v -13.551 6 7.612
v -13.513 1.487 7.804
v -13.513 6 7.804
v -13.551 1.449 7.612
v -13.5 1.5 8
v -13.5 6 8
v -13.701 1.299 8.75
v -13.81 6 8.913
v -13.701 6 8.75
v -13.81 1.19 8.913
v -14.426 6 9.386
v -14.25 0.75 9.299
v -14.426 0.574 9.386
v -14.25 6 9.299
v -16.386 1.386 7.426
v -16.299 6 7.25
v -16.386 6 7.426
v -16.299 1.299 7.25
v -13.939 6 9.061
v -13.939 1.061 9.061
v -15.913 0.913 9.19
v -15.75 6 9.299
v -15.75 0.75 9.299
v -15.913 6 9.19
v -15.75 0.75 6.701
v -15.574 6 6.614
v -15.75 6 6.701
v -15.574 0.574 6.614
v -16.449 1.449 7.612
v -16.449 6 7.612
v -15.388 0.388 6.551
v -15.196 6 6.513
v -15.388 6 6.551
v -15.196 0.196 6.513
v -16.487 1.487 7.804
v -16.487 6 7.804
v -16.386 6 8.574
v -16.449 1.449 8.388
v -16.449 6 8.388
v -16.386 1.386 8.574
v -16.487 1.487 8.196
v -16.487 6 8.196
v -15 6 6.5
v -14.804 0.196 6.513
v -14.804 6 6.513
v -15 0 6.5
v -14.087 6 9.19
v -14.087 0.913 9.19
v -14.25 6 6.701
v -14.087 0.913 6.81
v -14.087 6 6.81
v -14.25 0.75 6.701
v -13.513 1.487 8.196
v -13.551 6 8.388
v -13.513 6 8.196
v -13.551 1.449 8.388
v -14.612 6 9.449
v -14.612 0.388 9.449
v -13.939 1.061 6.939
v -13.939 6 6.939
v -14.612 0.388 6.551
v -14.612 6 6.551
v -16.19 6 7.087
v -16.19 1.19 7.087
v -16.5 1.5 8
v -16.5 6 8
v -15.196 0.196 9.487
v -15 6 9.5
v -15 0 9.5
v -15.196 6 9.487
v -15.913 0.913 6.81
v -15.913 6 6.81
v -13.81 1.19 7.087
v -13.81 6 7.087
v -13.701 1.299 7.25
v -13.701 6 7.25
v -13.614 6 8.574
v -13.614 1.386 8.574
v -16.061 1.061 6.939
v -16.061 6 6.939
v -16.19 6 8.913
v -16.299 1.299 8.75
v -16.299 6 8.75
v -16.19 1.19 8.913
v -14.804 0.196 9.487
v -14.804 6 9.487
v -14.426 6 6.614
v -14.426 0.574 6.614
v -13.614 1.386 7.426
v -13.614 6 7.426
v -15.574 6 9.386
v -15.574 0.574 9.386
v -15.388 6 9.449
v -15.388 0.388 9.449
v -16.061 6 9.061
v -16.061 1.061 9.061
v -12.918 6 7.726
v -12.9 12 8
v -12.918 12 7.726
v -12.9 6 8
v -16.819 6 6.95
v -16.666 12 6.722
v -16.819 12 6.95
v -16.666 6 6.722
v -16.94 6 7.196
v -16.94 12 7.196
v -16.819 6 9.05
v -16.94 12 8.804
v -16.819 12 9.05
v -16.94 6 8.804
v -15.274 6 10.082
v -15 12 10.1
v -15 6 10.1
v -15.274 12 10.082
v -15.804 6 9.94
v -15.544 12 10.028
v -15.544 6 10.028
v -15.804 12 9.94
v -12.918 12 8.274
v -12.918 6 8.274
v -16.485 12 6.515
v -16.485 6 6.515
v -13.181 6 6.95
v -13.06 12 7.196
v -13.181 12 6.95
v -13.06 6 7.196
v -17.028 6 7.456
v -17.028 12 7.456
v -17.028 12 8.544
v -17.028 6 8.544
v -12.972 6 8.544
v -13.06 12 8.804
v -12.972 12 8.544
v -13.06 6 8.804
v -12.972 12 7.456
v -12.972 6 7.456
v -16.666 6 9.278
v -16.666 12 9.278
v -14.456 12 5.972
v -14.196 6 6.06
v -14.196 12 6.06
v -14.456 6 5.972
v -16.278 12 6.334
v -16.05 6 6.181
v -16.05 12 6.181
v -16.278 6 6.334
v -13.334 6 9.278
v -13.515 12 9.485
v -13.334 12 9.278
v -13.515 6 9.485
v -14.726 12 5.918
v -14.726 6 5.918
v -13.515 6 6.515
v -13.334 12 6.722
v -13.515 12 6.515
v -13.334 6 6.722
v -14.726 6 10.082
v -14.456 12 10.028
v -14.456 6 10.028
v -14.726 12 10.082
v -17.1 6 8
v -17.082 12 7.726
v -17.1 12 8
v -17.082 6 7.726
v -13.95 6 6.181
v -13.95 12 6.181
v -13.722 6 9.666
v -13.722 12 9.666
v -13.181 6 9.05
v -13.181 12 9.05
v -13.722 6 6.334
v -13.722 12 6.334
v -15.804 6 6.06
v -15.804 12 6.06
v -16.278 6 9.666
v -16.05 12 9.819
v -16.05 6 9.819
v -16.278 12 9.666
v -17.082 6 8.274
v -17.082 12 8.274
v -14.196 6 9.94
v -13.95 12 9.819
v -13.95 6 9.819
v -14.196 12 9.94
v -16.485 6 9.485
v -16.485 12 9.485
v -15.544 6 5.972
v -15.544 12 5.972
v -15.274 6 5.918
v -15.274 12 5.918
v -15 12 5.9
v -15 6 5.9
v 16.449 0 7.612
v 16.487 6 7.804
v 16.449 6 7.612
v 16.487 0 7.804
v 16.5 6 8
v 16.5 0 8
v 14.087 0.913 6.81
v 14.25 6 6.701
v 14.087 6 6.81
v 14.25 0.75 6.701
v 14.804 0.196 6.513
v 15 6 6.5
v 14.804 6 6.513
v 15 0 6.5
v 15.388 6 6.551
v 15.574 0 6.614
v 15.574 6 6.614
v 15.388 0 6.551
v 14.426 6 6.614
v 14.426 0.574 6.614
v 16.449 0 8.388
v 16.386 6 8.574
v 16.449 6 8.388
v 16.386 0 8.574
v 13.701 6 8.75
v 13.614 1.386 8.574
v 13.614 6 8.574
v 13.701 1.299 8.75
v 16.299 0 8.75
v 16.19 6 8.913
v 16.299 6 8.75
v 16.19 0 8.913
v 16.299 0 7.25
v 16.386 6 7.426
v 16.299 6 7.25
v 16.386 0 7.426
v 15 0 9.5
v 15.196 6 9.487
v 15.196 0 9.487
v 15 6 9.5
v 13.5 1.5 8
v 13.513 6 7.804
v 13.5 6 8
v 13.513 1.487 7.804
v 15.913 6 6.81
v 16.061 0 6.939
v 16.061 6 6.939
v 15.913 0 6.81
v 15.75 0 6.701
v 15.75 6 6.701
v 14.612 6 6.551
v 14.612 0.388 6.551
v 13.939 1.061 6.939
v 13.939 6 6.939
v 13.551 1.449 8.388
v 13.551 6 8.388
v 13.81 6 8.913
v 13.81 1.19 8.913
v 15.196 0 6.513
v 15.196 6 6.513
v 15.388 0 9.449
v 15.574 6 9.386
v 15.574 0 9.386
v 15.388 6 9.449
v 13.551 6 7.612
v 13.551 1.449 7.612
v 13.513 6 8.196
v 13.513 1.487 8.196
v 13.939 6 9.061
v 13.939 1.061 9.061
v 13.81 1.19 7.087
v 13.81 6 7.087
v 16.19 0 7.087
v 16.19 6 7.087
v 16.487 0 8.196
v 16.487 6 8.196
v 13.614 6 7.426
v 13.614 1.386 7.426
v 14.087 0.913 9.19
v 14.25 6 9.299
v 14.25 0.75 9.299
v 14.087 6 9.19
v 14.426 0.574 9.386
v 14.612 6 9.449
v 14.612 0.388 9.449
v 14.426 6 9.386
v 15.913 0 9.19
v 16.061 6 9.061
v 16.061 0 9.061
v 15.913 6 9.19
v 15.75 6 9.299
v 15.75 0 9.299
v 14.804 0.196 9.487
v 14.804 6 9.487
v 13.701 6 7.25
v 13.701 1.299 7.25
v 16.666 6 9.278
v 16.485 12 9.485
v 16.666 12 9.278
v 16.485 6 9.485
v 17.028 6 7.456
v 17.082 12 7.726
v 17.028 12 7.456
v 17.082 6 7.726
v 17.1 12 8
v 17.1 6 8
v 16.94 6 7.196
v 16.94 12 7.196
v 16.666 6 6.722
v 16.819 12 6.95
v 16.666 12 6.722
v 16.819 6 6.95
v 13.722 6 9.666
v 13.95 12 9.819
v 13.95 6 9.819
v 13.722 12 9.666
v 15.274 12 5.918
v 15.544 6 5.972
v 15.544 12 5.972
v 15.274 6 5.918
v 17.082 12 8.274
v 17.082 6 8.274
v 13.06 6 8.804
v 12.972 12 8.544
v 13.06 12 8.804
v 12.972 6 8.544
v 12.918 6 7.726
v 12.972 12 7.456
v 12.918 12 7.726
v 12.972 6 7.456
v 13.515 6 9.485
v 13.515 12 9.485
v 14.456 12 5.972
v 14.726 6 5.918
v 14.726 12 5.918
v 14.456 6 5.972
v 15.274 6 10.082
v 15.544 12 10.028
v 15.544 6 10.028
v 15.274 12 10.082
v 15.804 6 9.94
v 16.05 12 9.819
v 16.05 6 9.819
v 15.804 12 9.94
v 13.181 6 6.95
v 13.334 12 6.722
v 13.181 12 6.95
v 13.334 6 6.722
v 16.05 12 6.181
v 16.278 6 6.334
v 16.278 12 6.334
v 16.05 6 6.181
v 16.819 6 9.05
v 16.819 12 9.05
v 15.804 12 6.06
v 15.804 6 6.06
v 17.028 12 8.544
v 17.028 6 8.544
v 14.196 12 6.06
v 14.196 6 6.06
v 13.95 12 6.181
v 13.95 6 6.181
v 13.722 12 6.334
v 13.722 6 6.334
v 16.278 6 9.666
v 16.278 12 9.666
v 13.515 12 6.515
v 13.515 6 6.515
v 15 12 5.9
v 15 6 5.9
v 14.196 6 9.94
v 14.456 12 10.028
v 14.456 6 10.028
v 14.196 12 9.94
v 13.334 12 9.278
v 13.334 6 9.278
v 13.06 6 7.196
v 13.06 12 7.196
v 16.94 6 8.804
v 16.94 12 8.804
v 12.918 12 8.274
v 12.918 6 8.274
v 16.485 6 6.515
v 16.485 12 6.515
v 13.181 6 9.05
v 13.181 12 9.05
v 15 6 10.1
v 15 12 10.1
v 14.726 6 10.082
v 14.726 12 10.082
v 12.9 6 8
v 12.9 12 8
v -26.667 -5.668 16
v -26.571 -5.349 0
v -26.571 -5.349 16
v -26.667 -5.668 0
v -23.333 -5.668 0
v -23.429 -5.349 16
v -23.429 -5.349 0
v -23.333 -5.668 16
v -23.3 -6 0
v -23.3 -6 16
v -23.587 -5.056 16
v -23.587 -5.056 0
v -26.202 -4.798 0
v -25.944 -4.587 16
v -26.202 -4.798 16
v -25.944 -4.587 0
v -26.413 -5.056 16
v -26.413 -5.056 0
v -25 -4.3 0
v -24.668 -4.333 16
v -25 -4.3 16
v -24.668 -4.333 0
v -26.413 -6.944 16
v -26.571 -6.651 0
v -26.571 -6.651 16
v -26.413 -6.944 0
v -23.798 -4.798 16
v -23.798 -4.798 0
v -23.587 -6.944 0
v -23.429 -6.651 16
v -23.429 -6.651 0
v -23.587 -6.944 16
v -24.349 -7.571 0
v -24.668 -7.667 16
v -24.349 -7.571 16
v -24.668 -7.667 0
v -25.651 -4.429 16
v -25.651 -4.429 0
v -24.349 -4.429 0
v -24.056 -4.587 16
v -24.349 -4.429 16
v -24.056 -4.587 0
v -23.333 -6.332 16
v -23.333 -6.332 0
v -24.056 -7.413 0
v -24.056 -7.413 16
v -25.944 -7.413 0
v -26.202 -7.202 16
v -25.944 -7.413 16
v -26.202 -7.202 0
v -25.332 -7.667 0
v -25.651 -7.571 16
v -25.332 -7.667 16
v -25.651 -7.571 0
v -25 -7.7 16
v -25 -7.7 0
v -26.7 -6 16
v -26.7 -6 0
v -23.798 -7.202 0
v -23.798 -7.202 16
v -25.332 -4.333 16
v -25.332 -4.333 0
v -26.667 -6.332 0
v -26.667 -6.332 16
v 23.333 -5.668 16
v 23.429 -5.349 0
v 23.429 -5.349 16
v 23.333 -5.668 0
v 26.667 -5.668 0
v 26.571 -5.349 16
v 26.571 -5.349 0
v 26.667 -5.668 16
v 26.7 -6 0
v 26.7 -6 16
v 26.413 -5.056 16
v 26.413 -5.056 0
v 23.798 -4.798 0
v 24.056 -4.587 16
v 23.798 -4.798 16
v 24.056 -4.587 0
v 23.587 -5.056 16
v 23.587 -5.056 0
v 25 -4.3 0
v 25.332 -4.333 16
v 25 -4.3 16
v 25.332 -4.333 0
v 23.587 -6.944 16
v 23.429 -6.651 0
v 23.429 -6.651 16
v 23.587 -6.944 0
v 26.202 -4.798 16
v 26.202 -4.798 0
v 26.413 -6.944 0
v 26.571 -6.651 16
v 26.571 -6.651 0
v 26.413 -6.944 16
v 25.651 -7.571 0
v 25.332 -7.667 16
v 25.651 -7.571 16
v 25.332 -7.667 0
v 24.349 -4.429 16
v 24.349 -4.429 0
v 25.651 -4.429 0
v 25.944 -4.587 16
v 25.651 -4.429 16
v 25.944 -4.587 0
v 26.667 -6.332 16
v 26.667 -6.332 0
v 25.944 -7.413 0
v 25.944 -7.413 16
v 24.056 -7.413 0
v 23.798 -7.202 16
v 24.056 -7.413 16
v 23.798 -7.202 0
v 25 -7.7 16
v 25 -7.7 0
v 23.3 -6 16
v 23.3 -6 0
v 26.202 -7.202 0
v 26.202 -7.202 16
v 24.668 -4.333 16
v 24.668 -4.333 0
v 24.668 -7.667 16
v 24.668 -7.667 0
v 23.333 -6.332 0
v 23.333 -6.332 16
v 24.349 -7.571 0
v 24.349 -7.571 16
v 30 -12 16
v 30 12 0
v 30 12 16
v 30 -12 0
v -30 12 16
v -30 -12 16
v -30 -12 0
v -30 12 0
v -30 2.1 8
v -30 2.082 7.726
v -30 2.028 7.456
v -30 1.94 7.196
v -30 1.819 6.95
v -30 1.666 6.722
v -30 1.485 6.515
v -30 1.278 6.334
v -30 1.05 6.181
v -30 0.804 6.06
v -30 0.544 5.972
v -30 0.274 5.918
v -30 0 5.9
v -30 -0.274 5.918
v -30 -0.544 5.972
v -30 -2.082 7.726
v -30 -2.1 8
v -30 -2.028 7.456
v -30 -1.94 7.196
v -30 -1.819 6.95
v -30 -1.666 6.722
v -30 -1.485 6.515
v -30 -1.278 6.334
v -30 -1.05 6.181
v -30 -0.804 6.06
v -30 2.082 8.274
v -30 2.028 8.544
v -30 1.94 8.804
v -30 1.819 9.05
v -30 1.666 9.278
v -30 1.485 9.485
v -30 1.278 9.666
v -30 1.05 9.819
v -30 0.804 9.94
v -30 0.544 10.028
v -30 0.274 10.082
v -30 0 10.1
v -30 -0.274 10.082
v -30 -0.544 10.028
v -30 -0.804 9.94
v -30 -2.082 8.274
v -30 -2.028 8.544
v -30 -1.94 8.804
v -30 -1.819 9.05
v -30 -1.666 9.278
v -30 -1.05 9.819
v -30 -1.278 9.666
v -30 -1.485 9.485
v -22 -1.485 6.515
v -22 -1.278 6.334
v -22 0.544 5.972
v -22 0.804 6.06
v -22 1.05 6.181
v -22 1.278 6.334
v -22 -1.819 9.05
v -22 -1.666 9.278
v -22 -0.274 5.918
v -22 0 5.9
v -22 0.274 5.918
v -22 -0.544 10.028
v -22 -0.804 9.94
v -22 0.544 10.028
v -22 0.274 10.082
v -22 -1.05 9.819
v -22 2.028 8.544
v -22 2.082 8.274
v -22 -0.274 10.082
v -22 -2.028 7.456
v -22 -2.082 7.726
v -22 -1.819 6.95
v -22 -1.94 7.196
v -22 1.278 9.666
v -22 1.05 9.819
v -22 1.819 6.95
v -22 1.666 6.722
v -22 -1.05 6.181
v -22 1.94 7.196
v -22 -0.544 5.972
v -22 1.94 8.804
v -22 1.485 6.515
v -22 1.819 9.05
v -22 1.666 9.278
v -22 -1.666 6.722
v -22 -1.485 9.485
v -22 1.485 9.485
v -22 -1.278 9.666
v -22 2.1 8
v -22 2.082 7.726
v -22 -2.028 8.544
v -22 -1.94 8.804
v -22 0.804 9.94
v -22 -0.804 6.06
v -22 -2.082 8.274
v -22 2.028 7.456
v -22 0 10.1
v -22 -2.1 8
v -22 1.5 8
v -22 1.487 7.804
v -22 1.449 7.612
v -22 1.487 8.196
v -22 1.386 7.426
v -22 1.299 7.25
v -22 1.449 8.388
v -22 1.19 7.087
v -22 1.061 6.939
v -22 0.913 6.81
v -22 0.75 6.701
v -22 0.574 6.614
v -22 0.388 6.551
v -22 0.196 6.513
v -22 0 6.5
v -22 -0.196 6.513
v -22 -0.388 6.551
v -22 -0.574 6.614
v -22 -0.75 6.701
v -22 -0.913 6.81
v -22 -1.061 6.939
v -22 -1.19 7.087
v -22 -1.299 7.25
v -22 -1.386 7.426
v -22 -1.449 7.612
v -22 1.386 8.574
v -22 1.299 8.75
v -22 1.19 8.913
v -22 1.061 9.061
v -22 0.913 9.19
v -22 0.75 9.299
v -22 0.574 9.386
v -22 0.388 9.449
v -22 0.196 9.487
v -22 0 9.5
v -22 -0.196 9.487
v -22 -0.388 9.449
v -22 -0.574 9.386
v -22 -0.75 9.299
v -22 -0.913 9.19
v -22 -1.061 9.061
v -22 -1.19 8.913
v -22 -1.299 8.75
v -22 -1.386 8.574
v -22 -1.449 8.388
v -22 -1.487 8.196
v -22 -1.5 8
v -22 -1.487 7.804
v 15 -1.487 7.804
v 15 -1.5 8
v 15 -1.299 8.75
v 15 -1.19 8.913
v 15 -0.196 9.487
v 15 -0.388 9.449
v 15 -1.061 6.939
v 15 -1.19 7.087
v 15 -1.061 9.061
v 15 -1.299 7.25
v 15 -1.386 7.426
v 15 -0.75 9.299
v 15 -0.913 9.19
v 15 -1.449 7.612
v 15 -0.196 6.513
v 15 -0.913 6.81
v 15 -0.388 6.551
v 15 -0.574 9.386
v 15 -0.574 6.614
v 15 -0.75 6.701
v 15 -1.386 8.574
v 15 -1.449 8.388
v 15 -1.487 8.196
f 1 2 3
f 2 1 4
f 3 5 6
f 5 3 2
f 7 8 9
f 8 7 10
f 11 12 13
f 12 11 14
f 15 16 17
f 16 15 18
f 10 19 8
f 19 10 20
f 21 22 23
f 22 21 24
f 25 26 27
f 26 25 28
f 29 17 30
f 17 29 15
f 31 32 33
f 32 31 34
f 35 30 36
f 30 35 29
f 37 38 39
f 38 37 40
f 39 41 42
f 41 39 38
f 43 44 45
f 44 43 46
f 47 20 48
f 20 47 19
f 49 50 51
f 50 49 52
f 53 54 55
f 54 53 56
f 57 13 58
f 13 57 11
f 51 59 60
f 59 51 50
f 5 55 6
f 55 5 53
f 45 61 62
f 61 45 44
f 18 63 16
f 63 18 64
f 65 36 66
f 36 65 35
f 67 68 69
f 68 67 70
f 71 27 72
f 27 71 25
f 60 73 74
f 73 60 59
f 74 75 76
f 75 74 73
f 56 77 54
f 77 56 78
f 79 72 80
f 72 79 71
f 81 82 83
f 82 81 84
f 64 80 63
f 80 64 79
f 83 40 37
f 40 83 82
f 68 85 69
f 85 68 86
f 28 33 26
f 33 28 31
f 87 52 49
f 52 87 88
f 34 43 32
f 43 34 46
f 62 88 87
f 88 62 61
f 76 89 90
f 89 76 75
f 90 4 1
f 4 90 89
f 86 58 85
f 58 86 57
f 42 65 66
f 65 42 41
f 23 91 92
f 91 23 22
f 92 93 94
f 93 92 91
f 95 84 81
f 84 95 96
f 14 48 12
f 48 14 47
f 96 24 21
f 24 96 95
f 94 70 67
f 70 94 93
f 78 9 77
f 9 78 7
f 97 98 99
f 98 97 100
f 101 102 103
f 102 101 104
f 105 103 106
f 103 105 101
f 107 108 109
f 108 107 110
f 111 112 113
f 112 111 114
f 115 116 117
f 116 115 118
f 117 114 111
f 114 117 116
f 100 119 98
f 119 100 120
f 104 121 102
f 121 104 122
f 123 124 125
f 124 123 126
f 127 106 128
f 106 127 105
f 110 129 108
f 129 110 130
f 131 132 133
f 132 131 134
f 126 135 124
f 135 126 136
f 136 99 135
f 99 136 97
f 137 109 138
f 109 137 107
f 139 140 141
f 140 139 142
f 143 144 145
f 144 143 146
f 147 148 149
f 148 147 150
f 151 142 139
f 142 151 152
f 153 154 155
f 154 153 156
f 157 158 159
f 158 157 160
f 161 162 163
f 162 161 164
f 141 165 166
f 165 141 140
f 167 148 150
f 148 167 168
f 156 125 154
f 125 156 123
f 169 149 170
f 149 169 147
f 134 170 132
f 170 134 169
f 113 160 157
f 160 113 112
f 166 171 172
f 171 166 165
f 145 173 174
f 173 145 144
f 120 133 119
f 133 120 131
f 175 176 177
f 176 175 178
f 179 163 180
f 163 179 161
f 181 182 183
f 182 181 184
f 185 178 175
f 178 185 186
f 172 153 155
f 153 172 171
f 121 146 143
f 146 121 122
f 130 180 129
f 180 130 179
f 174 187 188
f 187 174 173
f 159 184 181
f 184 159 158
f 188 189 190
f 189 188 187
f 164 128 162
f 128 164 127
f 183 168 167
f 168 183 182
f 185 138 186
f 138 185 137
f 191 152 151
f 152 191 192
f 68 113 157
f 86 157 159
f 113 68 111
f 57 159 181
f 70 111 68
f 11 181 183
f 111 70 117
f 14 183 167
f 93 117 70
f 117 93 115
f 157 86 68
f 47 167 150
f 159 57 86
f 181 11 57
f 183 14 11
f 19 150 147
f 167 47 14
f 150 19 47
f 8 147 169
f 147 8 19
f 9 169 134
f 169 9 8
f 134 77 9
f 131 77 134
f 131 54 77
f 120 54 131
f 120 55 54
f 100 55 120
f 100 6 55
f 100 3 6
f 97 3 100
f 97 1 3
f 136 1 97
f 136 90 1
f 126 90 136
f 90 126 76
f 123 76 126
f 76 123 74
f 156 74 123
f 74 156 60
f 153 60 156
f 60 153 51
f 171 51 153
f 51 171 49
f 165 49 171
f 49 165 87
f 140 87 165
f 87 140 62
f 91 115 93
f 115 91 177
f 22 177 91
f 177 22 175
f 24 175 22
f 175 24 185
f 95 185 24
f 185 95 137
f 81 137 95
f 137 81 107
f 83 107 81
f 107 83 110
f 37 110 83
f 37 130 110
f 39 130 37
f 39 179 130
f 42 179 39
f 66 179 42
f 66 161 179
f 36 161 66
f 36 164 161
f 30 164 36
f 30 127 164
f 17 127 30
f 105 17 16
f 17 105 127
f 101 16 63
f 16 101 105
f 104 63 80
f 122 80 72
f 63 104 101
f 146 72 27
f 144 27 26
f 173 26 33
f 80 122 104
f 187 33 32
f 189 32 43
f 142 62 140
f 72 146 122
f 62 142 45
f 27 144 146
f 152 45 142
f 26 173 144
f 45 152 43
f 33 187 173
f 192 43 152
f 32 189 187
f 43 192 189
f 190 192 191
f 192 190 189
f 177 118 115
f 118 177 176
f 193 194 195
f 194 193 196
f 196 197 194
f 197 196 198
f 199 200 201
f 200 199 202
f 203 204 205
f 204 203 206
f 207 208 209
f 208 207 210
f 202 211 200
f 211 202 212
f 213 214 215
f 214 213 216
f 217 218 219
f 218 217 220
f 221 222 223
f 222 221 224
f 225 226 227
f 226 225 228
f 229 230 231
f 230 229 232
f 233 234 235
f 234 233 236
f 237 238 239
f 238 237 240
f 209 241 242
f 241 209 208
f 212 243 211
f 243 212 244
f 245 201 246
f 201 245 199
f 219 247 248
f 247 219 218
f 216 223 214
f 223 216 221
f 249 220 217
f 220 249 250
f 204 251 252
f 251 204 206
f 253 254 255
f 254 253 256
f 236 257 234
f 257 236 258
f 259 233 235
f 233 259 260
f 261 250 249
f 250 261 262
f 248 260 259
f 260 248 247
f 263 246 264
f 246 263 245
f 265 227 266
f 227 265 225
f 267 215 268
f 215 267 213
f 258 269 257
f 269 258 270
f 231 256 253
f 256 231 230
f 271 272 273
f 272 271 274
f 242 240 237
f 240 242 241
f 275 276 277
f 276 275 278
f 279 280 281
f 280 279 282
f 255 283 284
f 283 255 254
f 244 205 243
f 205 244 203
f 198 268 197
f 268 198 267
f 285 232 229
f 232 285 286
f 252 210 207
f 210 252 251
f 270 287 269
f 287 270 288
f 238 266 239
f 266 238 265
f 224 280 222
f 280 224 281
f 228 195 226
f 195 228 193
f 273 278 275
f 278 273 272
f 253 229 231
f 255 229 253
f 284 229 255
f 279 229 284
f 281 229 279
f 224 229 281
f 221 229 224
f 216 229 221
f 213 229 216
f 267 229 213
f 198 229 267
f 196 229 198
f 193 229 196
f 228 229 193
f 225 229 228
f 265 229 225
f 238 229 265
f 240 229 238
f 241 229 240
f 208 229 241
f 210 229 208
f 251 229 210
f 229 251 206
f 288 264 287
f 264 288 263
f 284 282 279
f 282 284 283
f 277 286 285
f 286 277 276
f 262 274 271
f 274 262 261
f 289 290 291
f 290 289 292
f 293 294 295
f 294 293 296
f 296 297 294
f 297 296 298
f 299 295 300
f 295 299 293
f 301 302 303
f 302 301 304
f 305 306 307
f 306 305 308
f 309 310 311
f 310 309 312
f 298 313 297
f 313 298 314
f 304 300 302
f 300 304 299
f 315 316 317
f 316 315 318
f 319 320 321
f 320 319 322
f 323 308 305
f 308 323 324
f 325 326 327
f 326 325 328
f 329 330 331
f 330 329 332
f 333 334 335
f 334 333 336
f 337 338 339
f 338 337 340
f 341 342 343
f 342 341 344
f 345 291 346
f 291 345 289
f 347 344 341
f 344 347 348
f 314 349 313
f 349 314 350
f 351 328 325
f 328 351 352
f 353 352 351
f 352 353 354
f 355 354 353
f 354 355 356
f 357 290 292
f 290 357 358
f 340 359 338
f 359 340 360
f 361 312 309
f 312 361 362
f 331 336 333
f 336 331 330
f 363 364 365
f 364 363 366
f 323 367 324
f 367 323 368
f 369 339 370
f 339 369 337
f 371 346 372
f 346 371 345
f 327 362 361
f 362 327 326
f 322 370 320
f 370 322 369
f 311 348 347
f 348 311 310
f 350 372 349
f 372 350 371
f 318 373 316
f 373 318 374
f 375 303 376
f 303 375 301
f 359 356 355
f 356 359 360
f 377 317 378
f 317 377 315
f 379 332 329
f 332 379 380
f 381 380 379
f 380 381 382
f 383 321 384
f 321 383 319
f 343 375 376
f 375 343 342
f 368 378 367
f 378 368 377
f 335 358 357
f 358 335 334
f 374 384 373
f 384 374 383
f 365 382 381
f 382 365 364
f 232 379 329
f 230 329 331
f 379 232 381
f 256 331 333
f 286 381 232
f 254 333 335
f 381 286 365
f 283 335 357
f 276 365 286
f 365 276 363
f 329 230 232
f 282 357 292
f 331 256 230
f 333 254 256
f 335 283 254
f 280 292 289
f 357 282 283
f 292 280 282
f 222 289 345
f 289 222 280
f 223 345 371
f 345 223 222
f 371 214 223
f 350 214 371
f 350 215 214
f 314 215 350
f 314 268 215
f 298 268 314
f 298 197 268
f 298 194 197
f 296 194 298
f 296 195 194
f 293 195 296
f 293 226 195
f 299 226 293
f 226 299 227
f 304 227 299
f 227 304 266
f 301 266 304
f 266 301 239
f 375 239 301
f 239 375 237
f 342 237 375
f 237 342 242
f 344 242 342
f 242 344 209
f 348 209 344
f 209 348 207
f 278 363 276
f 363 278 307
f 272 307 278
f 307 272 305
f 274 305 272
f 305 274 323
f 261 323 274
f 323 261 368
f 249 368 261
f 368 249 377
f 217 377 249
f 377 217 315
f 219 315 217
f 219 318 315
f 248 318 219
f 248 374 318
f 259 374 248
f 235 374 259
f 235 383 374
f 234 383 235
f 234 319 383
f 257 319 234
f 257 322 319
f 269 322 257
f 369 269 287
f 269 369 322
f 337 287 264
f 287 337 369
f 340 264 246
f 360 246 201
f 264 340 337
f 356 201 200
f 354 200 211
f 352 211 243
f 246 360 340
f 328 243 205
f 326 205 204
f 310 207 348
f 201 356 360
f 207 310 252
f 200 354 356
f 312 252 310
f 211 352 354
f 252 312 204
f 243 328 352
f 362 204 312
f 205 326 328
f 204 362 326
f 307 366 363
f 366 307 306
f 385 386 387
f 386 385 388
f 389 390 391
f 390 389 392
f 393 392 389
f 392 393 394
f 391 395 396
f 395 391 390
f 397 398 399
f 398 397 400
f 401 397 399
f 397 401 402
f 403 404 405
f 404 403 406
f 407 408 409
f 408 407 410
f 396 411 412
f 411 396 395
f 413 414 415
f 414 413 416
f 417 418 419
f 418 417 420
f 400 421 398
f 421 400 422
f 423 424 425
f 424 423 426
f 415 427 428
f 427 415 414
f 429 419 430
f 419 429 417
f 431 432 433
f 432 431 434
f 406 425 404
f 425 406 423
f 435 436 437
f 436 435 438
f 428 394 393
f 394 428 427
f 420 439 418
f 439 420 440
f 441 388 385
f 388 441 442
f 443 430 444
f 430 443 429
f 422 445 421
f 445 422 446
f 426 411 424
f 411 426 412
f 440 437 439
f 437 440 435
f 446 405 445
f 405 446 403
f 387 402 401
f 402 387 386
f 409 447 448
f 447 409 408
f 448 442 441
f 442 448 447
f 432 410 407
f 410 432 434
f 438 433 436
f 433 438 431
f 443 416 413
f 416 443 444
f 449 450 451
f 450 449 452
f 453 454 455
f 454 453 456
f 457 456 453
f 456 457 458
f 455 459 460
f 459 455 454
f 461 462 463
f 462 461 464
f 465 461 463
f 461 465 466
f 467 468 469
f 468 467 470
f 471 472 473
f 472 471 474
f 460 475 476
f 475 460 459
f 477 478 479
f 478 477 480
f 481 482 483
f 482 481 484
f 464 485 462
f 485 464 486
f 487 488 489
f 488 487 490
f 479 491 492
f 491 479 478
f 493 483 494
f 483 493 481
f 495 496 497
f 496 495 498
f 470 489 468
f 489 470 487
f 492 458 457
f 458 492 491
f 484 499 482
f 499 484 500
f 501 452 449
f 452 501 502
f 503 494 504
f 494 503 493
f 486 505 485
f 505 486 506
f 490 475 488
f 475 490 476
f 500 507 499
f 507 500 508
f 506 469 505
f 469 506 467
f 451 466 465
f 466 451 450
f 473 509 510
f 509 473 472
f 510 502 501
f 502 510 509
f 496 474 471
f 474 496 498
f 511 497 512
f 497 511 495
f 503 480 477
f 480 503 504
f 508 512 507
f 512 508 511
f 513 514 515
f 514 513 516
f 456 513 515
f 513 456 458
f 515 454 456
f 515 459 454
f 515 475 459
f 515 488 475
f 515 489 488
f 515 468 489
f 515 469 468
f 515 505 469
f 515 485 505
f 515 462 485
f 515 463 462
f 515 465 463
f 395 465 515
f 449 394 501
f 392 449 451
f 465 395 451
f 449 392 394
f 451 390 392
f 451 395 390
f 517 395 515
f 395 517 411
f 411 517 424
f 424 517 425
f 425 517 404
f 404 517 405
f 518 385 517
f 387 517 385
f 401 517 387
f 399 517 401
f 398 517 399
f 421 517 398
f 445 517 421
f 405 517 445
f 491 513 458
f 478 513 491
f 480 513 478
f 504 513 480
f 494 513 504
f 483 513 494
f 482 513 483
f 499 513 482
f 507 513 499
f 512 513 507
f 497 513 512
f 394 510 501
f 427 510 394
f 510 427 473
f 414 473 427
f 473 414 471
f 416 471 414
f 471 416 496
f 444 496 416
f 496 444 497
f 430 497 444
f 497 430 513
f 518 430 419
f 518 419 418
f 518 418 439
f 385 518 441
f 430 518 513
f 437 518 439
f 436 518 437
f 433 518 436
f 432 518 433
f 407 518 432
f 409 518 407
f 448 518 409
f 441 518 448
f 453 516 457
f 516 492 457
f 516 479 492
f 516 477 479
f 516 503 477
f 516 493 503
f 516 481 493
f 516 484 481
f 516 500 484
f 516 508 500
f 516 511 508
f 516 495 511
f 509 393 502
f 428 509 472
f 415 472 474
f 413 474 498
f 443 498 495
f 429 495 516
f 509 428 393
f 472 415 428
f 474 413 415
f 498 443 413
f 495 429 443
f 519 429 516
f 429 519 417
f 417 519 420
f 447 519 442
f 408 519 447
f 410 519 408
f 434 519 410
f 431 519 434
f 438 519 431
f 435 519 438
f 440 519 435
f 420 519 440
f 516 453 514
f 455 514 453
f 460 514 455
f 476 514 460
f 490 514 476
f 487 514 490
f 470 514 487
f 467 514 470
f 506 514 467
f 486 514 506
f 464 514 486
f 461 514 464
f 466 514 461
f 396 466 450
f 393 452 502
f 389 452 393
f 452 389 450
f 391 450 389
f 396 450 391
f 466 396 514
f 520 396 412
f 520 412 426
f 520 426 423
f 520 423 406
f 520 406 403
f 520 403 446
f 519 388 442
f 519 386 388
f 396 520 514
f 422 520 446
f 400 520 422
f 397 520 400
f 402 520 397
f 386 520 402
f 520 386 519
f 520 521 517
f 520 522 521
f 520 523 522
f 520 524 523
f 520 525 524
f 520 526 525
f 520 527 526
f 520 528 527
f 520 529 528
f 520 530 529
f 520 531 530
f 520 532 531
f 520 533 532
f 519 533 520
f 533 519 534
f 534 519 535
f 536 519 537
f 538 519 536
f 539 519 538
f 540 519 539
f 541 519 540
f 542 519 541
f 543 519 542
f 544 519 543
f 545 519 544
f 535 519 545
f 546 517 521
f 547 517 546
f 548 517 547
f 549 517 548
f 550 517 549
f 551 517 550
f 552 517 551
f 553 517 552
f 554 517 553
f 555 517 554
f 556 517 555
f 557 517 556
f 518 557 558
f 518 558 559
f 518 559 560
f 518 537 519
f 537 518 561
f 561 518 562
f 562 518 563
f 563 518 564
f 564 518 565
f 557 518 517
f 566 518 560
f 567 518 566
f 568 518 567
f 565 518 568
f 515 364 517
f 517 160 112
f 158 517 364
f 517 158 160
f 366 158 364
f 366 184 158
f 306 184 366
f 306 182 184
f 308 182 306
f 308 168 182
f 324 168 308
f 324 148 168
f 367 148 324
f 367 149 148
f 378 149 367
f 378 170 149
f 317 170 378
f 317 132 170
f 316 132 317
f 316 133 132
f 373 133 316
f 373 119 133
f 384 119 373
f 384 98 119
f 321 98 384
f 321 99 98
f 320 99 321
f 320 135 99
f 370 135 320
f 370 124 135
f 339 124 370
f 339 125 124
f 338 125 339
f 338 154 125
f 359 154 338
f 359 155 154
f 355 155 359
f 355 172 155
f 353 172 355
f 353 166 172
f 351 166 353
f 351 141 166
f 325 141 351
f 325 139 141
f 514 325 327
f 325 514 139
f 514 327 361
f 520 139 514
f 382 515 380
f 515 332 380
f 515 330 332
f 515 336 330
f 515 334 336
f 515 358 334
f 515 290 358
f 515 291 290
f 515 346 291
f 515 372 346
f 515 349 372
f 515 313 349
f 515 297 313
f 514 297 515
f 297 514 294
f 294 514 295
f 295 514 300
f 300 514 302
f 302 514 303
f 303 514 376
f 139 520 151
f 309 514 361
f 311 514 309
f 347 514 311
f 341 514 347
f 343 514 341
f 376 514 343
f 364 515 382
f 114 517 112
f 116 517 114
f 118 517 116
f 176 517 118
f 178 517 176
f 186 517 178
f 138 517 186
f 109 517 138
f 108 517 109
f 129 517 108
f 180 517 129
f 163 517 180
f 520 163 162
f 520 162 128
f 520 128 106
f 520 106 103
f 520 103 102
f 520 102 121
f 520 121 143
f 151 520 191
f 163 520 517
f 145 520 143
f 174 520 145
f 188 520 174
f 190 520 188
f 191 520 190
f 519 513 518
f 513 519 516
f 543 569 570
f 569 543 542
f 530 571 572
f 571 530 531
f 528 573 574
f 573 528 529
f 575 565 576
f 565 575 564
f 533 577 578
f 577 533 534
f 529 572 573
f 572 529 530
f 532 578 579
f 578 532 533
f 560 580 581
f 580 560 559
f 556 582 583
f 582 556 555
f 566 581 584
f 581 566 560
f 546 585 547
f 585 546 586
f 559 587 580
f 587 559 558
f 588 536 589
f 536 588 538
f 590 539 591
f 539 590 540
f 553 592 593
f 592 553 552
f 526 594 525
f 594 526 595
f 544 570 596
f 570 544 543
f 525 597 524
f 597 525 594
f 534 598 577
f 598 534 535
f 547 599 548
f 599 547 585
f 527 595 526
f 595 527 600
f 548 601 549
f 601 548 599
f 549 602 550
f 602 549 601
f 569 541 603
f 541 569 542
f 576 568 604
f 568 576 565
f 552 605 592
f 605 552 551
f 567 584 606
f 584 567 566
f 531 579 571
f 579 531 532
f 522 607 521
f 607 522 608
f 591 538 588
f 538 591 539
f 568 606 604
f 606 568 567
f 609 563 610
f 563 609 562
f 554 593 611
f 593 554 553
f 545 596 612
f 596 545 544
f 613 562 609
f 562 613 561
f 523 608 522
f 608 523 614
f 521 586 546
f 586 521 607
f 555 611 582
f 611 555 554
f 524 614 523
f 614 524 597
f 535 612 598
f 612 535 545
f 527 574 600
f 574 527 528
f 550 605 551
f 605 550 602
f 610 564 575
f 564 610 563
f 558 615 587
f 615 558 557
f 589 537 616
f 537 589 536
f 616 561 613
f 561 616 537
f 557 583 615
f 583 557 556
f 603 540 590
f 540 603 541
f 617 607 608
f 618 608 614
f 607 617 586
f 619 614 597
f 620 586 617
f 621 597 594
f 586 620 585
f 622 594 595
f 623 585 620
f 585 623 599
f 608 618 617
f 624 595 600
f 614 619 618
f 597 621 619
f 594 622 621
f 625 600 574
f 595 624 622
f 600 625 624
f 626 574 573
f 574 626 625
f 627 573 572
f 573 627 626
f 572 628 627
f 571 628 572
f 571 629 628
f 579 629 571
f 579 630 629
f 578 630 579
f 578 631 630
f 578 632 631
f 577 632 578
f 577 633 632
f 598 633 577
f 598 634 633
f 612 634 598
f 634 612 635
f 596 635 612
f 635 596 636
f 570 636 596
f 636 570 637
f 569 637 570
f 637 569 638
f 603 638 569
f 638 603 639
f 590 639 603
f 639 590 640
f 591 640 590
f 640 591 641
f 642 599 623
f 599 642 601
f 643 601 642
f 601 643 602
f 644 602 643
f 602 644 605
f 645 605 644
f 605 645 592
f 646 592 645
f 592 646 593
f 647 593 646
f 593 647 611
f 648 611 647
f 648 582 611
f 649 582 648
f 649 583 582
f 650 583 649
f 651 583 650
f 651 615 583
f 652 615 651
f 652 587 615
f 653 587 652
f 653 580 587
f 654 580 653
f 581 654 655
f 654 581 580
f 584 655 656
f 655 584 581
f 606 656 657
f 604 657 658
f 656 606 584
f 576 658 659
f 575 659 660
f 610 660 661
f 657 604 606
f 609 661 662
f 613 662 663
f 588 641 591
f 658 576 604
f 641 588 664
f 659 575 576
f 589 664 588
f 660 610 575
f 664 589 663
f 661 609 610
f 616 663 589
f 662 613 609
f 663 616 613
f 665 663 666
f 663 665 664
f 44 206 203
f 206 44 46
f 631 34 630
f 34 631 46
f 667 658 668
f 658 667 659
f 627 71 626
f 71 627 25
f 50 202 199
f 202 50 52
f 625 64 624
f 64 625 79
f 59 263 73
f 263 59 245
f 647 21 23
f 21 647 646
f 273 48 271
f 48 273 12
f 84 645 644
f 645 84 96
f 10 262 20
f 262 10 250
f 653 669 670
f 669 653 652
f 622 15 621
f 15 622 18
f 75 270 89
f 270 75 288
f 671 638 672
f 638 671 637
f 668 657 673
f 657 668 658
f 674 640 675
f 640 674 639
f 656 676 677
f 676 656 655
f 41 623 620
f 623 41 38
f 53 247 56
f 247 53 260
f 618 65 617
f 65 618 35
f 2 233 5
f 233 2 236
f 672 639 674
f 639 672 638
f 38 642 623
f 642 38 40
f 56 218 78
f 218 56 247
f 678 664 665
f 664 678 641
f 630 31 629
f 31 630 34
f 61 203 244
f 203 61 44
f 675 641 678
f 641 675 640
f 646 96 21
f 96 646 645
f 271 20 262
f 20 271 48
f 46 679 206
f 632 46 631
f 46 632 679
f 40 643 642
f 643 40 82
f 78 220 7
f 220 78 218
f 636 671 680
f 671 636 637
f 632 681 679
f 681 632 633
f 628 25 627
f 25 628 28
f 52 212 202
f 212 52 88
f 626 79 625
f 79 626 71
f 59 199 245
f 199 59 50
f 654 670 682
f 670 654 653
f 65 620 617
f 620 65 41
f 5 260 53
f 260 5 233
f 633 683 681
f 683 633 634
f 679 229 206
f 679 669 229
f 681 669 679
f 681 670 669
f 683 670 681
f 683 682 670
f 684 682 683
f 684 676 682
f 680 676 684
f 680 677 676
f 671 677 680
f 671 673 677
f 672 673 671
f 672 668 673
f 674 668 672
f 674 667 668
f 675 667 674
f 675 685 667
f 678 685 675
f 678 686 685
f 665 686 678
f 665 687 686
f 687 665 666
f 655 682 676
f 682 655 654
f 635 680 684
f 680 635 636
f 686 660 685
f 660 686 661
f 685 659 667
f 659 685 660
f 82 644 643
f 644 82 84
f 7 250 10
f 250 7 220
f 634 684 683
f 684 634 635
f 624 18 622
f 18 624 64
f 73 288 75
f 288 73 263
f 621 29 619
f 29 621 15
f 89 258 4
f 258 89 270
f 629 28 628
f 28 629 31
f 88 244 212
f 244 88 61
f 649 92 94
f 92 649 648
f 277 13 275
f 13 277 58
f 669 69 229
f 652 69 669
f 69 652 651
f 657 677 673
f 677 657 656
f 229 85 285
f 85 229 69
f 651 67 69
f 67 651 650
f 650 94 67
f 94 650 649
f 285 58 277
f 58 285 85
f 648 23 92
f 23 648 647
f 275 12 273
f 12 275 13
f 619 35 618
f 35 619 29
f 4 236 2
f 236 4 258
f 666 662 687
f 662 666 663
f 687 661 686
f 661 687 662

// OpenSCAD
// KNOWN-WRONG PART (must fail): two outlets (at x = -15 and 15) instead of three
// Manifold block: one tubing inlet split into three outlets through internal channels
// Category: hardware. 3 mm channels in the mid-plane: an inlet socket on the -X face feeds a main
// channel that ends inside the block; three branches run to sockets on the +Y face.
// Print: PETG, lying on its bottom face, 0.15 mm layers, 100 % infill (watertight walls);
// the 3 mm channels bridge cleanly. Leak-test before use; glue the tubing into the sockets.
// SPDX-License-Identifier: CERN-OHL-P-2.0

/* [Manifold] */
block = [60, 24, 16];     // X, Y, Z [mm], centred in X and Y
ch_z = 8;                 // channel mid-plane
ch_d = 3;
sock_d = 4.2;             // socket for 4 mm OD tubing
inlet_sock = 8;           // inlet socket depth (from the -X face)
outlet_sock = 6;          // outlet socket depth (from the +Y face)
main_end = 15;            // the main channel stops at x = 15
outlets_x = [-15, 15];   
screw_d = 3.4;            // M3 clearance
screws = [[-25, -6], [25, -6]];

/* [Hidden] */
eps = 0.01;

difference() {
    translate([-block.x / 2, -block.y / 2, 0]) cube(block);
    // inlet socket and main channel along +X
    translate([-block.x / 2 - 1, 0, ch_z]) rotate([0, 90, 0]) cylinder(d = sock_d, h = inlet_sock + 1, $fn = 48);
    translate([-block.x / 2 - 1, 0, ch_z]) rotate([0, 90, 0]) cylinder(d = ch_d, h = block.x / 2 + main_end + 1, $fn = 48);
    // outlet branches along +Y, each ending in a socket
    for (x = outlets_x) {
        translate([x, 0, ch_z]) rotate([-90, 0, 0]) cylinder(d = ch_d, h = block.y / 2 + 1, $fn = 48);
        translate([x, block.y / 2 - outlet_sock, ch_z]) rotate([-90, 0, 0]) cylinder(d = sock_d, h = outlet_sock + 1, $fn = 48);
    }
    for (p = screws) translate([p.x, p.y, -1]) cylinder(d = screw_d, h = block.z + 2, $fn = 32);
}
